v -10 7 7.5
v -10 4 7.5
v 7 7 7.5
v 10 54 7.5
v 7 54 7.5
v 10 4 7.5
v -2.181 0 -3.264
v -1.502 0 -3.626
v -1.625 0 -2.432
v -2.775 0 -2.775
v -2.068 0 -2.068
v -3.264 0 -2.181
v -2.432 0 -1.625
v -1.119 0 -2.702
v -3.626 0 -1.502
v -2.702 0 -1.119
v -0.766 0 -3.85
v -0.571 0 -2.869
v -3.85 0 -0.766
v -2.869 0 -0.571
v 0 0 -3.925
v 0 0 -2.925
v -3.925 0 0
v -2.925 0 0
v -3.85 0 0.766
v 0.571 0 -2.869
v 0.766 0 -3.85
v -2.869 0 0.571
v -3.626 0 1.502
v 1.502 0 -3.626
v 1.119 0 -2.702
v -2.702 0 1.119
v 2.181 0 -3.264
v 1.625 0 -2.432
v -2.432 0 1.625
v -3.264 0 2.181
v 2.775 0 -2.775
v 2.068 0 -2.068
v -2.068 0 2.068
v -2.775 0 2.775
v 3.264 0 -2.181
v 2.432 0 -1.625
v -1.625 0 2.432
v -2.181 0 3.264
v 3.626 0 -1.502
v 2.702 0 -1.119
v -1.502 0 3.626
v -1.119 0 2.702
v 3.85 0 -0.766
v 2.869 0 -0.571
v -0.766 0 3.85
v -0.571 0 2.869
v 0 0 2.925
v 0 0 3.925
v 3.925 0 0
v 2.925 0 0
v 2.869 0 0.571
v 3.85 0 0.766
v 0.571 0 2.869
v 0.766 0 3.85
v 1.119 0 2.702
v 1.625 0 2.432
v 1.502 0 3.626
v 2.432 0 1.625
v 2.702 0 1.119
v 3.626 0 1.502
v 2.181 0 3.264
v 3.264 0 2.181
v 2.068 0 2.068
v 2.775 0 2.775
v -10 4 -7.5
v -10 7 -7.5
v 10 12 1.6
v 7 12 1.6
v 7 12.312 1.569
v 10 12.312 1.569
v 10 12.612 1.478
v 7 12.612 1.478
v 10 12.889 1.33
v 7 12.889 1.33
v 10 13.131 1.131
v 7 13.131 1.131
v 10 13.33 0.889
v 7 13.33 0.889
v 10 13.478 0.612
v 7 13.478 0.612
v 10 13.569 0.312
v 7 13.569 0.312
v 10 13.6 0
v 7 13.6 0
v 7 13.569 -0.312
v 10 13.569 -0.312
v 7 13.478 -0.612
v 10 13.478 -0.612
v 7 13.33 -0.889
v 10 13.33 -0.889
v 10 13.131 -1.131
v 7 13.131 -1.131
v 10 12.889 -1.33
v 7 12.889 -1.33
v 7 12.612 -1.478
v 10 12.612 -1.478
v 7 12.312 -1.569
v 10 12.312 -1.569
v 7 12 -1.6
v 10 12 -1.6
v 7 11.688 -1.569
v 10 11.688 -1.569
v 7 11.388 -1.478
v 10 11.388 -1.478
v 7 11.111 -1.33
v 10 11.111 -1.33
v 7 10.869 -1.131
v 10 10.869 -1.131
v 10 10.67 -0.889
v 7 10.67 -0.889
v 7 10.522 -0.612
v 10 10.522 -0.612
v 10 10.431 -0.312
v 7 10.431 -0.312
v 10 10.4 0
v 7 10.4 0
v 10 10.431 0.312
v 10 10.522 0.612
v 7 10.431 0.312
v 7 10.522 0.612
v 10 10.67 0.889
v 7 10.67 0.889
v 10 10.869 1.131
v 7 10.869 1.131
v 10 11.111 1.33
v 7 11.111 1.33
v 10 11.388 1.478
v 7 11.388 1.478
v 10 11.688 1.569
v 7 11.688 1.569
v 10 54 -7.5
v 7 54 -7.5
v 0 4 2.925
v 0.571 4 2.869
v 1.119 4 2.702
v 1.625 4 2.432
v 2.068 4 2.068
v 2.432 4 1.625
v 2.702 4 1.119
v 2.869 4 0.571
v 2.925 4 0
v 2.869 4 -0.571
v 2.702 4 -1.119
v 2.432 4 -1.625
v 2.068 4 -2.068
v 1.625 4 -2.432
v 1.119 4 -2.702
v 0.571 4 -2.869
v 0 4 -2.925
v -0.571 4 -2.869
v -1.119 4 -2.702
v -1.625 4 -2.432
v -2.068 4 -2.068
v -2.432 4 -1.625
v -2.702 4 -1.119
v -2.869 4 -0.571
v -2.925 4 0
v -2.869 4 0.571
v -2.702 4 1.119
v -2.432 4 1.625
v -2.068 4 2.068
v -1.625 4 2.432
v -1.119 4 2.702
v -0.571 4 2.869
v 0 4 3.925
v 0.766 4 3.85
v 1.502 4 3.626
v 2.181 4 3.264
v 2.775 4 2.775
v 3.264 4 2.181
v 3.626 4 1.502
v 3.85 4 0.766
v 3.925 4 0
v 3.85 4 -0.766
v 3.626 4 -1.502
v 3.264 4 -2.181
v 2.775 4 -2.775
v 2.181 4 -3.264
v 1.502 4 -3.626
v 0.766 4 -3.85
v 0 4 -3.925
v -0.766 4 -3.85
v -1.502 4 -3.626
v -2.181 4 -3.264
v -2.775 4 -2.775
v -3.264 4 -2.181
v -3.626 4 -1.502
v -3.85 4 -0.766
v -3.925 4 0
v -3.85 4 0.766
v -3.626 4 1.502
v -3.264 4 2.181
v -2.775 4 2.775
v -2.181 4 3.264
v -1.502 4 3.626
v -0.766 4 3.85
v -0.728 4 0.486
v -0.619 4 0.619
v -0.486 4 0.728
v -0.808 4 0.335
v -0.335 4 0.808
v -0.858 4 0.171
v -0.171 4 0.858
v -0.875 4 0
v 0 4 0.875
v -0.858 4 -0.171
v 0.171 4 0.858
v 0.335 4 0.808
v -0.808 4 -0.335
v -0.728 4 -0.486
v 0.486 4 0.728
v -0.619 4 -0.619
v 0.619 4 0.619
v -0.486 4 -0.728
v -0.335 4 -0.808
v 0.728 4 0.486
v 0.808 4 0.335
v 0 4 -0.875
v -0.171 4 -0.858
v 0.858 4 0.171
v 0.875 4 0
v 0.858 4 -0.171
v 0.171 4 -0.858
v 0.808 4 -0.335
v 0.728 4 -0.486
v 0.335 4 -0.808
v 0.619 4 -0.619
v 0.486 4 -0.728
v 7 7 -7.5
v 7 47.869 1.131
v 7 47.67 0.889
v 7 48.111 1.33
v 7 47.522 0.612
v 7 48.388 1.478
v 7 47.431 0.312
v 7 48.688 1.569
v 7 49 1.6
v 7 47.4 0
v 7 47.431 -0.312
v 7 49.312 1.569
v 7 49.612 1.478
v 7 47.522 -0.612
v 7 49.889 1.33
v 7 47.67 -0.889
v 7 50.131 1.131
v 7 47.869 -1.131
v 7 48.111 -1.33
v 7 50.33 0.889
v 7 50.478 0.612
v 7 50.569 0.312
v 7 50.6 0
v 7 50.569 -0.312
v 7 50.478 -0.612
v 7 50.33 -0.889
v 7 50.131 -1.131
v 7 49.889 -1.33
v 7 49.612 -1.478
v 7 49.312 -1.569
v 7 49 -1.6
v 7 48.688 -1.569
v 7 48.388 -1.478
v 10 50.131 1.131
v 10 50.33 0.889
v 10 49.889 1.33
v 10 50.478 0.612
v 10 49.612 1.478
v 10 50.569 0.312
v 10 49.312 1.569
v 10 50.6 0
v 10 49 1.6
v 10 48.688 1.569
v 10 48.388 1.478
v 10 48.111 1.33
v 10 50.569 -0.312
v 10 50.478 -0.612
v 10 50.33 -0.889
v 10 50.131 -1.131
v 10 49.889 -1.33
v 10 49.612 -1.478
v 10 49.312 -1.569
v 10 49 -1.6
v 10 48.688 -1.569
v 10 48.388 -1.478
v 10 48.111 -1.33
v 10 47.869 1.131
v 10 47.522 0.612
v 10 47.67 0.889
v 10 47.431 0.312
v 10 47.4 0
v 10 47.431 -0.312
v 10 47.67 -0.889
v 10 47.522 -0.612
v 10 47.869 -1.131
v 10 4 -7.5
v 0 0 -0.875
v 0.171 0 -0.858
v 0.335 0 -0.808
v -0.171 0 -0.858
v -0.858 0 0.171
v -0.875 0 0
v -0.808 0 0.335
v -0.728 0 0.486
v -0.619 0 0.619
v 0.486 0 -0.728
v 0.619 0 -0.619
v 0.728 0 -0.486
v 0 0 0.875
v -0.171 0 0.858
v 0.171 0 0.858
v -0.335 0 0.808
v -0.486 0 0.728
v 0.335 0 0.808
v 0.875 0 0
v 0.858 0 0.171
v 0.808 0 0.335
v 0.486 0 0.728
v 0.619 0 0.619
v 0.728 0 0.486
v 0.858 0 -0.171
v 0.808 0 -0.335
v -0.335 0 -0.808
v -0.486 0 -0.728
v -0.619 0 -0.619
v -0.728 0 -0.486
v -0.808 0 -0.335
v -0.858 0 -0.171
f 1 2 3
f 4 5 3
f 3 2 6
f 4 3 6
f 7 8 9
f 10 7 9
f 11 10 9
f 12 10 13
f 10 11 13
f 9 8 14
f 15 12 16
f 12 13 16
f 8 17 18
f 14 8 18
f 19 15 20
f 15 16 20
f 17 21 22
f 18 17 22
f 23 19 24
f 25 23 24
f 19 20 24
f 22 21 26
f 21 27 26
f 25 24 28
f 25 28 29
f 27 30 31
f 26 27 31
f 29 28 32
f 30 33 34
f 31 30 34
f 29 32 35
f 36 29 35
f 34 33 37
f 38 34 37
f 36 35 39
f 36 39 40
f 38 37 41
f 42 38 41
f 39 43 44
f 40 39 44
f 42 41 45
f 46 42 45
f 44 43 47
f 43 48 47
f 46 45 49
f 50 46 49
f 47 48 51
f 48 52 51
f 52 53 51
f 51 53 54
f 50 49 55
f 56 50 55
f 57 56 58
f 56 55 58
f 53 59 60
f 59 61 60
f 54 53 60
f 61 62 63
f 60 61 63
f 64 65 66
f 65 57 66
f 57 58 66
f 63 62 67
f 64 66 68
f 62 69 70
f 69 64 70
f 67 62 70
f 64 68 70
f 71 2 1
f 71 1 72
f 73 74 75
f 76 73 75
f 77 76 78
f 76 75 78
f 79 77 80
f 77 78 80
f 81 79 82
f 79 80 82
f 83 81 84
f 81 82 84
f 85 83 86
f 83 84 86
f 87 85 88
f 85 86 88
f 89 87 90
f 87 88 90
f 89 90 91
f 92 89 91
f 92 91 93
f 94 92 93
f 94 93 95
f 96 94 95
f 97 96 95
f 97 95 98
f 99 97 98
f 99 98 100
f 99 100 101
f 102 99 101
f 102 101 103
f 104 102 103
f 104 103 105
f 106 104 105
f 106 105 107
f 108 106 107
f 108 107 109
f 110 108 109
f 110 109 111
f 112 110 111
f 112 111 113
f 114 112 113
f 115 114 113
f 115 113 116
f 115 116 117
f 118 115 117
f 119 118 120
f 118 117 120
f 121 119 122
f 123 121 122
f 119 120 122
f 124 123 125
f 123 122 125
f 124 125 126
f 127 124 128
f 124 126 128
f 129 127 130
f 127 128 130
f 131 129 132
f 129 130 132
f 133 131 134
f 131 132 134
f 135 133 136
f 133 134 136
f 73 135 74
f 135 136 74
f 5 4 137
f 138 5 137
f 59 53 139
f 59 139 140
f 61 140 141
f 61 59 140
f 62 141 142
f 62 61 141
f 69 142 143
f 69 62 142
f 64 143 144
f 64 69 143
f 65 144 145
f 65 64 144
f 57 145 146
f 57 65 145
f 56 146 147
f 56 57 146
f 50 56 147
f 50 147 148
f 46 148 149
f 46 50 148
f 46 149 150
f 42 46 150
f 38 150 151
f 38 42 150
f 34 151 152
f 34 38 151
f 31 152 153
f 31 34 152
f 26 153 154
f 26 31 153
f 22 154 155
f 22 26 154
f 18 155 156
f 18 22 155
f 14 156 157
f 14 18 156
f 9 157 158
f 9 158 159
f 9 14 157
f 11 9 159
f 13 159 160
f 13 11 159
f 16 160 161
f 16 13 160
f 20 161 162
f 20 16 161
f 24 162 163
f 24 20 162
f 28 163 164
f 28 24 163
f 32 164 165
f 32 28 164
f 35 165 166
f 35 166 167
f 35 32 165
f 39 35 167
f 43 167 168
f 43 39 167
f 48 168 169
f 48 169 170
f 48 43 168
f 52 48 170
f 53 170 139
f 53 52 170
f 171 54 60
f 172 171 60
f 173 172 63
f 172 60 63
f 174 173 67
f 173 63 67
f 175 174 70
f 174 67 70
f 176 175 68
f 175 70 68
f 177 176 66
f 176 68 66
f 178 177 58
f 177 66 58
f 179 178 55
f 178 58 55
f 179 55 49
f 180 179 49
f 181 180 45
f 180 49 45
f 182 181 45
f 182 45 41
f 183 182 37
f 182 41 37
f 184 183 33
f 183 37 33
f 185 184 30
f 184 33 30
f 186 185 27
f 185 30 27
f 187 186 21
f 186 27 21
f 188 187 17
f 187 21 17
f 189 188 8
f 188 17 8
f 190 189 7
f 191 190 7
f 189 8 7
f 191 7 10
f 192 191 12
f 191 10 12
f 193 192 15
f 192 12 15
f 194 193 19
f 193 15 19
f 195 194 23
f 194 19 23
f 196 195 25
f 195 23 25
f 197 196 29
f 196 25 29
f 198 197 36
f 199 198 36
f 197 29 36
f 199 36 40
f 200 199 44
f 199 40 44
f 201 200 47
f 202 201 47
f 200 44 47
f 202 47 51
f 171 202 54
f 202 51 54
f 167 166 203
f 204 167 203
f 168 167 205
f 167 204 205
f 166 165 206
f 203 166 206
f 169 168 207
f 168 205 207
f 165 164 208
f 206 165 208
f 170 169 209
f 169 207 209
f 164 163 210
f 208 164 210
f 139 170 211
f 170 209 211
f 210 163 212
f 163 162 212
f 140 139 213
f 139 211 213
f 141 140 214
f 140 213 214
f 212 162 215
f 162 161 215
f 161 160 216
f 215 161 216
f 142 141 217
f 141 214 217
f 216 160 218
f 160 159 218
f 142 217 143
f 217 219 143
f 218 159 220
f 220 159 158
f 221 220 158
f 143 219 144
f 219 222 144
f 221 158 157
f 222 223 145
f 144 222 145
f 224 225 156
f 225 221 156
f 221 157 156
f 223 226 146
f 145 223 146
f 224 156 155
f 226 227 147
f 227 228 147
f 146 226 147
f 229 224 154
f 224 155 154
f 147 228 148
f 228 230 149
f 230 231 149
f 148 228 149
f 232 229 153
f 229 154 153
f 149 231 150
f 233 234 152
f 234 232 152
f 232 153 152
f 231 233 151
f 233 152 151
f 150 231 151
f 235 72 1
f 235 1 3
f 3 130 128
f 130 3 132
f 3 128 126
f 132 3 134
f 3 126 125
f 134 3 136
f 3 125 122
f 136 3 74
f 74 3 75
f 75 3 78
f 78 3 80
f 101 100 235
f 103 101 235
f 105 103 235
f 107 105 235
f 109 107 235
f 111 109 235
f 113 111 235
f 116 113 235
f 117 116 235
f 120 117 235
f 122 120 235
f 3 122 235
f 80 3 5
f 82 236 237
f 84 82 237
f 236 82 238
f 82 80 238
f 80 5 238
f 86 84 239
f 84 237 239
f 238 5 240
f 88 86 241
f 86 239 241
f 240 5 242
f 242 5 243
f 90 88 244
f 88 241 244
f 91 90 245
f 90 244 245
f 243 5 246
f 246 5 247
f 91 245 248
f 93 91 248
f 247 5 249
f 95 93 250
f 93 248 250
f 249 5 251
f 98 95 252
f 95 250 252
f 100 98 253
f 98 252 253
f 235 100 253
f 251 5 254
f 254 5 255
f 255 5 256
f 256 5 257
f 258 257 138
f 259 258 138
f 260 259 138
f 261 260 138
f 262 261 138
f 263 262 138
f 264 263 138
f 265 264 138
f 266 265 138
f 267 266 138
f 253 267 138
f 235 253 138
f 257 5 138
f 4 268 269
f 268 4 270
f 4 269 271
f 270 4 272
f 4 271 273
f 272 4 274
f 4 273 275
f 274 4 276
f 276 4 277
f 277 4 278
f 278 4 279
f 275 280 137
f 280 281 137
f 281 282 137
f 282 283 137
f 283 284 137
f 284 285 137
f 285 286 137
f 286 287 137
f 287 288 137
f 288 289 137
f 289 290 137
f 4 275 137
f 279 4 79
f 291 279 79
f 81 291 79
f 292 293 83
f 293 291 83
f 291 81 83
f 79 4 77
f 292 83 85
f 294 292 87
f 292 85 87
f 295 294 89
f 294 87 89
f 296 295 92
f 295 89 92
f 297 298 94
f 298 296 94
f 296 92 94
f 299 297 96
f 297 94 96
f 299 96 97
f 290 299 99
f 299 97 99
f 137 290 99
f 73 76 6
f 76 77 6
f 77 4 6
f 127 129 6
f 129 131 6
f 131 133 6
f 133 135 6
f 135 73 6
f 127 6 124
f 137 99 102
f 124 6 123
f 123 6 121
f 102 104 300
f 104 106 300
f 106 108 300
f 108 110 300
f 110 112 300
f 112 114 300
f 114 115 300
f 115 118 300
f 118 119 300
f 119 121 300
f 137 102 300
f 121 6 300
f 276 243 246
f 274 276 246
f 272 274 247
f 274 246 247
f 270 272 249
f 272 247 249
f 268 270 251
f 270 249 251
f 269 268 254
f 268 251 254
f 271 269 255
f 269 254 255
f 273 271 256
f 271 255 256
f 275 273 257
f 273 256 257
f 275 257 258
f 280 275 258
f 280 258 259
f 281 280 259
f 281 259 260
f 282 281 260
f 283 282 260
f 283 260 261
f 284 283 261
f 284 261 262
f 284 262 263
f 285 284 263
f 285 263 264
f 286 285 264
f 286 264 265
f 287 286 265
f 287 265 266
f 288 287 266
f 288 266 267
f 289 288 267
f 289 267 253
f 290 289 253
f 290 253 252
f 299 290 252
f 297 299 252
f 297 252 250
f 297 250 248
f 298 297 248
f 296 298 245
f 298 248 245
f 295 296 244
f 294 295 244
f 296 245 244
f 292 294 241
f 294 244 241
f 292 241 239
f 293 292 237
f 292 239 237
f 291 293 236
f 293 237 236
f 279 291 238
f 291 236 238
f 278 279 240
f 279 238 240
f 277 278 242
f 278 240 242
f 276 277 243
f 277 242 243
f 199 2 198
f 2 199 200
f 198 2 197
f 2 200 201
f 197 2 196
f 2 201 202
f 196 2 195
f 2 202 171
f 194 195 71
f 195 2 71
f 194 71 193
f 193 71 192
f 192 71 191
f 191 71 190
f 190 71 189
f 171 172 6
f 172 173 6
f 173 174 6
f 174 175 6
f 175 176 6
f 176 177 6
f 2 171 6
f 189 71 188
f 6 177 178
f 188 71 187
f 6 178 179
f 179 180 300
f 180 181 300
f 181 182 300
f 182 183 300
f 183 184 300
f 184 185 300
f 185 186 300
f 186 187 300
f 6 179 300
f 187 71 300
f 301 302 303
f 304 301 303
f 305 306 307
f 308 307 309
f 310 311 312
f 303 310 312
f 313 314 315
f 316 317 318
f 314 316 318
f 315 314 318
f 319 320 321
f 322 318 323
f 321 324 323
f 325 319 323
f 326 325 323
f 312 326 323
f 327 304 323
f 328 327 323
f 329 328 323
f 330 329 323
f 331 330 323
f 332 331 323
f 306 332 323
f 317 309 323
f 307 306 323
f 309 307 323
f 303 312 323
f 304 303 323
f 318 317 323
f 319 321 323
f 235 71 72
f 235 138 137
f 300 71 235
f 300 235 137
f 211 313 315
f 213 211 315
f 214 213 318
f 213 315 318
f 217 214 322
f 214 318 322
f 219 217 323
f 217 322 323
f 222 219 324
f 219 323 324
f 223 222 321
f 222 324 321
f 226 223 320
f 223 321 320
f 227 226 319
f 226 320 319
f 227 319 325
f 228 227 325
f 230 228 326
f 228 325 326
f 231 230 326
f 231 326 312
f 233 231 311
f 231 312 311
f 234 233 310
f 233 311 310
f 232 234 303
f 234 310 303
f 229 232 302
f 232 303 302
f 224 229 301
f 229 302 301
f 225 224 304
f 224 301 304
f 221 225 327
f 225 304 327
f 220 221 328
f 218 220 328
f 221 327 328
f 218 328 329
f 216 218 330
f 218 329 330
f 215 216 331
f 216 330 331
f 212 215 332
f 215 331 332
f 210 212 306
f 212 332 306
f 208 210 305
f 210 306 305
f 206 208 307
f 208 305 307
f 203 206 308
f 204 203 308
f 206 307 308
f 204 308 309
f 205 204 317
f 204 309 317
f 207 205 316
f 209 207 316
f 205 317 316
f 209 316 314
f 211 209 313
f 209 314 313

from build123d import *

# Parameters (mm, degrees)
SKETCH1_R                      = 3.925
SKETCH1_R_2                    = 2.924999992
BOSS_EXTRUDE1_DEPTH            = 4
SKETCH1_R_3                    = 0.875
BOSS_EXTRUDE1_2_DEPTH          = 4
SKETCH2_W                      = 20
SKETCH2_H                      = 15
BOSS_EXTRUDE2_DEPTH            = 3
BOSS_EXTRUDE3_START            = 10
SKETCH3_W                      = 15
SKETCH3_H                      = 50
BOSS_EXTRUDE3_DEPTH            = 3
F_3_2_3_2_DIAMETER_HOLE1_D     = 3.2
F_3_2_3_2_DIAMETER_HOLE1_DEPTH = 4
F_3_2_3_2_DIAMETER_HOLE1_TIP   = 0.96137699


with BuildPart() as part:
    # Sketch1 → Boss-Extrude1 (new body)
    with BuildSketch(Plane(origin=(0, 0, 0), x_dir=(1, 0, 0), z_dir=(0, 1, 0))):
        with Locations(Location((0, 0, 0), (0, 0, 270))):
            Circle(SKETCH1_R)
        with Locations(Location((0, 0, 0), (0, 0, 270))):
            Circle(SKETCH1_R_2, mode=Mode.SUBTRACT)
    extrude(amount=BOSS_EXTRUDE1_DEPTH)



with BuildPart() as body_2:
    # Sketch1 → Boss-Extrude1 2 (new body)
    with BuildSketch(Plane(origin=(0, 0, 0), x_dir=(1, 0, 0), z_dir=(0, 1, 0))):
        with Locations(Location((0, 0, 0), (0, 0, 270))):
            Circle(SKETCH1_R_3)
    extrude(amount=BOSS_EXTRUDE1_2_DEPTH)


with BuildPart() as part_1:
    add(part.part)

    add(body_2.part)  # Boss-Extrude2 merges body 2
    # Sketch2 → Boss-Extrude2 (add)
    with BuildSketch(Plane(origin=(0, 4, 0), x_dir=(1, 0, 0), z_dir=(0, 1, 0))):
        Rectangle(SKETCH2_W, SKETCH2_H)
    extrude(amount=BOSS_EXTRUDE2_DEPTH)

    # Sketch3 → Boss-Extrude3 (add)
    with BuildSketch(Plane(origin=(0, 0, 0), x_dir=(0, 0, -1), z_dir=(1, 0, 0)).offset(BOSS_EXTRUDE3_START)):
        with Locations((0, 29)):
            Rectangle(SKETCH3_W, SKETCH3_H)
    extrude(amount=-BOSS_EXTRUDE3_DEPTH)

    # Ø3.2 (3.2) Diameter Hole1
    with Locations(Plane(origin=(10, 0, 0), x_dir=(0, 0, -1), z_dir=(1, 0, 0))):
        with Locations((0, 12), (0, 49)):
            Hole(F_3_2_3_2_DIAMETER_HOLE1_D / 2, depth=F_3_2_3_2_DIAMETER_HOLE1_DEPTH)
            with Locations((0, 0, -(F_3_2_3_2_DIAMETER_HOLE1_DEPTH + F_3_2_3_2_DIAMETER_HOLE1_TIP / 2))):  # 118° drill point
                Cone(0, F_3_2_3_2_DIAMETER_HOLE1_D / 2, F_3_2_3_2_DIAMETER_HOLE1_TIP, mode=Mode.SUBTRACT)


solid = part_1.part
